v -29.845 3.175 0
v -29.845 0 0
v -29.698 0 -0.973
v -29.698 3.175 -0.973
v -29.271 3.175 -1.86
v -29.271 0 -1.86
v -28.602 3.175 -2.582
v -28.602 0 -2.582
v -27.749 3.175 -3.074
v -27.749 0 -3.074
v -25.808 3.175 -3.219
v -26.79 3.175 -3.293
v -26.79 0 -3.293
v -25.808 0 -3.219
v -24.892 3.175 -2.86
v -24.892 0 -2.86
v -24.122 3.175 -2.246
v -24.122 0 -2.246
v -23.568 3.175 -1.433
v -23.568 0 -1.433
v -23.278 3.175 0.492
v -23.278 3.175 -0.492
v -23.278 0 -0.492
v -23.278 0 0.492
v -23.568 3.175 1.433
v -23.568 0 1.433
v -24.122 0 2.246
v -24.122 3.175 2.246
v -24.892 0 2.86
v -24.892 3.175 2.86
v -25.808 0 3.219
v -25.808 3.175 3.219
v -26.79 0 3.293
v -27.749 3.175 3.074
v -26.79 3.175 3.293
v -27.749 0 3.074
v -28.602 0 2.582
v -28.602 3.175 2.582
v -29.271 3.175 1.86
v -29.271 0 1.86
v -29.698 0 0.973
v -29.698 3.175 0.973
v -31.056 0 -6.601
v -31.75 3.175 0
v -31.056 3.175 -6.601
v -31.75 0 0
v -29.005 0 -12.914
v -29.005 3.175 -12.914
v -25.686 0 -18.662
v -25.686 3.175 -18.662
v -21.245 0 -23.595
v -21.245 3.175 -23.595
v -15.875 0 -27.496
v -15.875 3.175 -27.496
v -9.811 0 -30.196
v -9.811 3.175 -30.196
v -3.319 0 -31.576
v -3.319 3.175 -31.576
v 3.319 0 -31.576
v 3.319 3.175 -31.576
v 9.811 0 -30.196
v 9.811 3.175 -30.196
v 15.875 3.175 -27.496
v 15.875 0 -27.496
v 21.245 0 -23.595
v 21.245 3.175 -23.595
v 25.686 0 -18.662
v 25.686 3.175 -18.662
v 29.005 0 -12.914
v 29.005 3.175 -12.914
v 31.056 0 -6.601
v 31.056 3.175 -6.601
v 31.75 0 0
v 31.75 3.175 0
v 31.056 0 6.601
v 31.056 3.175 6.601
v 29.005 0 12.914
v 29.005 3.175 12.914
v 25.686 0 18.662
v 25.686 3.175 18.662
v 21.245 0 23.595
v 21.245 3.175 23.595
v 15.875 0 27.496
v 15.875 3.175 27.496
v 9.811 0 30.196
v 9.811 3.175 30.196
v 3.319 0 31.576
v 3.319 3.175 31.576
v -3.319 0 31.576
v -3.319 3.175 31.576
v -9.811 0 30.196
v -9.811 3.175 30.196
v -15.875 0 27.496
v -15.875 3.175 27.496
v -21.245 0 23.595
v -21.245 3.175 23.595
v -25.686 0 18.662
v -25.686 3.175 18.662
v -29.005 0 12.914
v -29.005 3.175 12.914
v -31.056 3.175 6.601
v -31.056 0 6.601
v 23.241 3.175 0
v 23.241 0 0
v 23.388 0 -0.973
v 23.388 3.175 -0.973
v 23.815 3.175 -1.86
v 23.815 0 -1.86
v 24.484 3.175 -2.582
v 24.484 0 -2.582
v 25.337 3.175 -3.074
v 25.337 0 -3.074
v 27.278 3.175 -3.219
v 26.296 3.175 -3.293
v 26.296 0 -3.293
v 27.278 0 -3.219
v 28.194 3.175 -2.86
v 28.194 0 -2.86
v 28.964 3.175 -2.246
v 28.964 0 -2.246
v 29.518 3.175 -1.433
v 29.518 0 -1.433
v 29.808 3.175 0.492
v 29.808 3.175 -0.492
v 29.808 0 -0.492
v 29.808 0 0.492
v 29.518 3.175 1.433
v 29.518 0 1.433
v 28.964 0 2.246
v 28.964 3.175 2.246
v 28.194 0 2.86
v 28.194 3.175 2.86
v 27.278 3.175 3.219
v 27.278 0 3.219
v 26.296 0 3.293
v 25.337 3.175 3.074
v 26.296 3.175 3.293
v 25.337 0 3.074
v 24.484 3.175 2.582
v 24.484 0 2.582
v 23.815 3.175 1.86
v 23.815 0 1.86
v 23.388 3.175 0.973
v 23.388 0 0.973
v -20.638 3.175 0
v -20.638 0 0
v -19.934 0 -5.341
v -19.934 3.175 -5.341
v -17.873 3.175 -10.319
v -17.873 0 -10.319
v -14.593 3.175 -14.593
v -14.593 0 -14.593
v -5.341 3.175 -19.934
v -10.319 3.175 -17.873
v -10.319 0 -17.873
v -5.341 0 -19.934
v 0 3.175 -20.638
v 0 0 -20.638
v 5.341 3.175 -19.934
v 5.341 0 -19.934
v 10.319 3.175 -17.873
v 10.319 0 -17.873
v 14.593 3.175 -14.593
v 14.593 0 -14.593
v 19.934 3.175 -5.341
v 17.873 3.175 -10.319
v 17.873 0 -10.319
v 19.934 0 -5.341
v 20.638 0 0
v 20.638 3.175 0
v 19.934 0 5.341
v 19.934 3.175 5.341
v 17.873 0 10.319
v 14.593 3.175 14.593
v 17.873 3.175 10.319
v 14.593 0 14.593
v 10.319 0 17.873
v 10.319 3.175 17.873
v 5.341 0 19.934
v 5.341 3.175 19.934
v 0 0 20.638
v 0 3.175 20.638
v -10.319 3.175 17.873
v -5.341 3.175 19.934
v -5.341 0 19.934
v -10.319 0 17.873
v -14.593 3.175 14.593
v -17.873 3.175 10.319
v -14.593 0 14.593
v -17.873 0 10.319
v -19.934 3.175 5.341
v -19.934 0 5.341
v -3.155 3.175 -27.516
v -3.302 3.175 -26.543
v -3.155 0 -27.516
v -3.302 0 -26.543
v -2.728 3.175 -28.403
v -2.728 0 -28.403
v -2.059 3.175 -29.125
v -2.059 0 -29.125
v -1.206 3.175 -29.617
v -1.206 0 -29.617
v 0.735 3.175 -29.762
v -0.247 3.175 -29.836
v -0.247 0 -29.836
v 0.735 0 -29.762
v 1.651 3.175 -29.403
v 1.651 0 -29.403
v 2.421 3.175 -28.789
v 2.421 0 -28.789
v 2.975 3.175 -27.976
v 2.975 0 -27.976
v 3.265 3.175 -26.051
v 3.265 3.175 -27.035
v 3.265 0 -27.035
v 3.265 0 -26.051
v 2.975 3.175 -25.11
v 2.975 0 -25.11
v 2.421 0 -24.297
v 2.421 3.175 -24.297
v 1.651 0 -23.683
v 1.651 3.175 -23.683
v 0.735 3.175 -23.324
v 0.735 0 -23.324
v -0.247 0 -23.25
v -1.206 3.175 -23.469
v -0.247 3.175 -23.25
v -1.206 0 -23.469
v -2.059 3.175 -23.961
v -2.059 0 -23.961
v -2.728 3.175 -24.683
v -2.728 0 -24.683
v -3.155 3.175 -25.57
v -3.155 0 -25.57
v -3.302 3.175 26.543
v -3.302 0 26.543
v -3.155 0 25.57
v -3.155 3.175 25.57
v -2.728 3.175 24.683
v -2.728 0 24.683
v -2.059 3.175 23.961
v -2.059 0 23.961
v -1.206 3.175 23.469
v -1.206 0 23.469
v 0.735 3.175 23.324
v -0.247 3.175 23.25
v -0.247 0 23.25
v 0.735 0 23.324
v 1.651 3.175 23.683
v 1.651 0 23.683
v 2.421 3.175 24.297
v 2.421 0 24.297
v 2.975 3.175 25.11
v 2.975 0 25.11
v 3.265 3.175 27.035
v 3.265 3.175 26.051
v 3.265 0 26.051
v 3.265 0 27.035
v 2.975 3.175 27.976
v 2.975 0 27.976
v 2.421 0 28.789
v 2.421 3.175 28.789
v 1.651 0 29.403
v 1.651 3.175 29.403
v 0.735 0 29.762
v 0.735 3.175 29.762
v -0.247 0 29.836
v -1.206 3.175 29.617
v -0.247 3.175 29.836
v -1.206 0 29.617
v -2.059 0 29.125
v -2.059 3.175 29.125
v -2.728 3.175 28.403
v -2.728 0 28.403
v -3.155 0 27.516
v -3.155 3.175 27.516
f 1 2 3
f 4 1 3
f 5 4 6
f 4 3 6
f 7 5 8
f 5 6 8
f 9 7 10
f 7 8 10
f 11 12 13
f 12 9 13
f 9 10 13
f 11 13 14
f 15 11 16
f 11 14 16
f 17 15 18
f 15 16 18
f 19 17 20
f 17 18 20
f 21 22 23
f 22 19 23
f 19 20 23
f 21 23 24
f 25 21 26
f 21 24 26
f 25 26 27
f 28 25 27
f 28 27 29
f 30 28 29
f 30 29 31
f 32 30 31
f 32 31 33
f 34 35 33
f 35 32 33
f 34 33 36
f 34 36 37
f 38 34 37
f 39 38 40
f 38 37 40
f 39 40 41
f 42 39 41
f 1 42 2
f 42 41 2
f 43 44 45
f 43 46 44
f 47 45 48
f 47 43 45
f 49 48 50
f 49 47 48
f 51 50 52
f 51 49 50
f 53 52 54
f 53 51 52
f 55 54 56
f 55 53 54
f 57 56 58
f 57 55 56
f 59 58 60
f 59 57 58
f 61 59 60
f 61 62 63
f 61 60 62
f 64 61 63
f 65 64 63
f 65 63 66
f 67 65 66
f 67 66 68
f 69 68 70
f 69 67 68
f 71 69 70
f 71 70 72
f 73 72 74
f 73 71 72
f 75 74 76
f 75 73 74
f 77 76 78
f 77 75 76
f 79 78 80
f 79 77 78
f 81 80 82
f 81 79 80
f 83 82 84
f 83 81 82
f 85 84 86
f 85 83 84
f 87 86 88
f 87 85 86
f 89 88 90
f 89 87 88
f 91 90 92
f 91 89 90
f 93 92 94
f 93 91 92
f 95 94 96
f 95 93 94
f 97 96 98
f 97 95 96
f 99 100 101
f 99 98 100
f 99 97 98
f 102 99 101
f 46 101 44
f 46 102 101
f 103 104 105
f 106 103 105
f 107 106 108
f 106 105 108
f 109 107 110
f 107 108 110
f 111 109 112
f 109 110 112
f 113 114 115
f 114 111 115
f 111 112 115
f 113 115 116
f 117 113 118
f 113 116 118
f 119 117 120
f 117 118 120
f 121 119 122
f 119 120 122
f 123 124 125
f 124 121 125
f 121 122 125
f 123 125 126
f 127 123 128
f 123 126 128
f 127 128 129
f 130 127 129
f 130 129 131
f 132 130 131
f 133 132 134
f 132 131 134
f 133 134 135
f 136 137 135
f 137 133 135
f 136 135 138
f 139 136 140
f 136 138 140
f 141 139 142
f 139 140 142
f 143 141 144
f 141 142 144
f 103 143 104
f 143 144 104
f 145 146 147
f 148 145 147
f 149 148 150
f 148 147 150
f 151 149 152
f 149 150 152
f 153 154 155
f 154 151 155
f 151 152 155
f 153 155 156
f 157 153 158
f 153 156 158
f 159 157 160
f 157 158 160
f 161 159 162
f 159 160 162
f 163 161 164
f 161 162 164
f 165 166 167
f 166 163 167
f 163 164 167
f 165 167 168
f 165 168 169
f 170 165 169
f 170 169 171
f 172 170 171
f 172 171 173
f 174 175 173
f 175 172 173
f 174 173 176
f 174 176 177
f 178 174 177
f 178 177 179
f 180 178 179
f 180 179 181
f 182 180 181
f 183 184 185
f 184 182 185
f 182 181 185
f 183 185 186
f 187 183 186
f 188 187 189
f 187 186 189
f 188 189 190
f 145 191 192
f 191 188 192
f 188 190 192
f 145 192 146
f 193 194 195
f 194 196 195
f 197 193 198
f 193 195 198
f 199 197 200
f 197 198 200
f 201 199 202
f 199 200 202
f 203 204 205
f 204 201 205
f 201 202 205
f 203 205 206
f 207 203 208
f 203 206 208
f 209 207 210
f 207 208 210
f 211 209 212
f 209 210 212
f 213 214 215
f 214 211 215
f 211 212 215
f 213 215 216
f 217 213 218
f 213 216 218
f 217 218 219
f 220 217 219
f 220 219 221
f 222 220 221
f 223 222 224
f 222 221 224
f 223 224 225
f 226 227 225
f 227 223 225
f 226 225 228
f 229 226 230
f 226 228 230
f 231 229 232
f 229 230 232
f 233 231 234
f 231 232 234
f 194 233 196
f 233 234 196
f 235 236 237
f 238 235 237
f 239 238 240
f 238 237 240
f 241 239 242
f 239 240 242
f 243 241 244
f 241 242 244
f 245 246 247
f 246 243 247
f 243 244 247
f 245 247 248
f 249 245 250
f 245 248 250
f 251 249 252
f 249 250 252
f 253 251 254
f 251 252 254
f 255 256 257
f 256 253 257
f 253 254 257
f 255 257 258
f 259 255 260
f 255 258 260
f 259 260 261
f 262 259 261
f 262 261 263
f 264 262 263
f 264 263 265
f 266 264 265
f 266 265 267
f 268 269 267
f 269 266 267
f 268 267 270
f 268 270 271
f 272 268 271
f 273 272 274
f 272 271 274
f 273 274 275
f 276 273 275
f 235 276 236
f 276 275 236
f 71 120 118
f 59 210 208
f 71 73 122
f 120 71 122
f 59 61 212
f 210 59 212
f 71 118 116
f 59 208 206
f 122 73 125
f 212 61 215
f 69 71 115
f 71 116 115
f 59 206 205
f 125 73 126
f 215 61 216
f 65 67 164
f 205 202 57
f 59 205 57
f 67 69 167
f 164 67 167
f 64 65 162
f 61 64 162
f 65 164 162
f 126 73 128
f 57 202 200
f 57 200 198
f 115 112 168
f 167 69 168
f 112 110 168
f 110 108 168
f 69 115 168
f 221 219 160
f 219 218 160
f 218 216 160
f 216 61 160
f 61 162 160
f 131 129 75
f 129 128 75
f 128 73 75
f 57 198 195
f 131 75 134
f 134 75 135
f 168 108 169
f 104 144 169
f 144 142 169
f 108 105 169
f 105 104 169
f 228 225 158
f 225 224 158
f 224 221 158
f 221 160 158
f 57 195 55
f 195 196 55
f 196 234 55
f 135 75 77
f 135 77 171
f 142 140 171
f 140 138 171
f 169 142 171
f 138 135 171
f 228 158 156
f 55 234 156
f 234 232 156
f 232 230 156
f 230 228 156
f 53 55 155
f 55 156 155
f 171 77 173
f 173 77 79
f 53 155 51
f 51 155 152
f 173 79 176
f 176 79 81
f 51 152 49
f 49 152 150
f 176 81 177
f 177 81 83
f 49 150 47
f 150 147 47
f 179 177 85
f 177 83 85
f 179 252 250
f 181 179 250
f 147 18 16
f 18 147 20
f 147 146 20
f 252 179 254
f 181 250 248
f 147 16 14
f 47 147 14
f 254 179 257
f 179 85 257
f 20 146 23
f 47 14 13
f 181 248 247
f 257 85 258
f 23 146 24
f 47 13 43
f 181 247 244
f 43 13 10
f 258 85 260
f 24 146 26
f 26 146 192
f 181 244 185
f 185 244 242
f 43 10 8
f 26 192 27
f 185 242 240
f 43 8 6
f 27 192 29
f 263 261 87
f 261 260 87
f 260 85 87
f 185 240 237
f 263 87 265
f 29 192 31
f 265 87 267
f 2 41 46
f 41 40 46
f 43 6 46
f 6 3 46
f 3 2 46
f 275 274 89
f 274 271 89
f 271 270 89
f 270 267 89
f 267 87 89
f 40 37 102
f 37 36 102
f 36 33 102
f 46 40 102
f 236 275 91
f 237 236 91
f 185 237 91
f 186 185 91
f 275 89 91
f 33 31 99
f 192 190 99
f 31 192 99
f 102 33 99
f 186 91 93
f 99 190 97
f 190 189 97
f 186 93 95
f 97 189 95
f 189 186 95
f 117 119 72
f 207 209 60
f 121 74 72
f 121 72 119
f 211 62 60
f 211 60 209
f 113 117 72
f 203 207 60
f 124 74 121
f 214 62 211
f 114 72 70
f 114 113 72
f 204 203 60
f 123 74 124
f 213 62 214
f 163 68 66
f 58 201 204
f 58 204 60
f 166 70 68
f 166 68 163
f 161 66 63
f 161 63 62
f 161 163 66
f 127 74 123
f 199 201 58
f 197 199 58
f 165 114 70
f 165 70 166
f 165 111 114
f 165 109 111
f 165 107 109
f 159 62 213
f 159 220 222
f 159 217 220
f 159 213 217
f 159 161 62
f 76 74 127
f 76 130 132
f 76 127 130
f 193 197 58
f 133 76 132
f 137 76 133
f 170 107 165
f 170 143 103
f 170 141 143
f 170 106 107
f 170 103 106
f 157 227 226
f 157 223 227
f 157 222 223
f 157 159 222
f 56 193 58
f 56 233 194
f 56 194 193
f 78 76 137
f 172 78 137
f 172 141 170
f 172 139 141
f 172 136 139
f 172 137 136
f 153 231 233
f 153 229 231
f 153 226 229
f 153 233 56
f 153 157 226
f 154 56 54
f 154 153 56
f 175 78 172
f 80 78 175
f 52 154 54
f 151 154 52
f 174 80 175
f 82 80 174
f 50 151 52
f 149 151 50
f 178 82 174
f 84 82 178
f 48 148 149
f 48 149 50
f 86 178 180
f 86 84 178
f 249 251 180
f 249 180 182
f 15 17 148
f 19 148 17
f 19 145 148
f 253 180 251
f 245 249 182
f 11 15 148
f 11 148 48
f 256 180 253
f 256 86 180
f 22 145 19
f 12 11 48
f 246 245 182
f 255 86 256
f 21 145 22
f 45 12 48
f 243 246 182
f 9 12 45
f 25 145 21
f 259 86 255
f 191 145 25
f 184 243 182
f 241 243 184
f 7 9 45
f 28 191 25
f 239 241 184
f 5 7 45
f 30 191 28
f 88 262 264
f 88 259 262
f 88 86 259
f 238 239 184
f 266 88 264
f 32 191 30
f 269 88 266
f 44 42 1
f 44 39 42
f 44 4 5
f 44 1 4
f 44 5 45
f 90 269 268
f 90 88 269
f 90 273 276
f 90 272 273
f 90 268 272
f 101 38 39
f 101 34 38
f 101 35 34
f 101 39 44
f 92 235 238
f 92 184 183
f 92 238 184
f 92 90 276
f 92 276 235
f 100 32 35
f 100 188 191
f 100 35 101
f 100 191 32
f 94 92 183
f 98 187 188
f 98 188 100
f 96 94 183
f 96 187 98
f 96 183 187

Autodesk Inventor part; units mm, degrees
ref_plane "YZ Plane" through (0, 0, 0) normal (1, 0, 0) x (0, 1, 0)
ref_plane "XZ Plane" through (0, 0, 0) normal (0, 1, 0) x (-1, 0, 0)
ref_plane "XY Plane" through (0, 0, 0) normal (0, 0, 1) x (1, 0, 0)
sketch "Sketch1" plane through (0, 0, 0) normal (0, 1, 0) x (-1, 0, 0)
  circle A0 centre (0, 0) radius 26.543 construction
  circle A1 centre (0, 26.543) radius 3.302
  circle A2 centre (26.543, 0) radius 3.302
  circle A3 centre (-26.543, 0) radius 3.302
  circle A4 centre (0, -26.543) radius 3.302
  circle A5 centre (0, 0) radius 20.6375
  circle A6 centre (0, 0) radius 31.75
  dimension "d0" = 53.086
  dimension "d1" = 6.604
  dimension "d2" = 6.604
  dimension "d3" = 6.604
  dimension "d4" = 6.604
  dimension "d5" = 41.275
  dimension "d6" = 63.5
extrude "Plate1" add sketch "Sketch1" along normal blind 3.175
equation "\"BendRadius\" = Thickness"
equation "\"BendReliefWidth\" = Thickness"
equation "\"BendReliefDepth\" = 0.5 * Thickness"
equation "\"CornerReliefSize\" = 4 * Thickness"
equation "\"MinimumRemnant\" = 2 * Thickness"
equation "\"TransitionRadius\" = BendRadius"
equation "\"JacobiRadiusSize\" = BendRadius"
equation "\"GapSize\" = Thickness"
equation "\"d7\" = BendRadius"
equation "\"Thickness\" = 3.175"
properties part number "Hub 2"
